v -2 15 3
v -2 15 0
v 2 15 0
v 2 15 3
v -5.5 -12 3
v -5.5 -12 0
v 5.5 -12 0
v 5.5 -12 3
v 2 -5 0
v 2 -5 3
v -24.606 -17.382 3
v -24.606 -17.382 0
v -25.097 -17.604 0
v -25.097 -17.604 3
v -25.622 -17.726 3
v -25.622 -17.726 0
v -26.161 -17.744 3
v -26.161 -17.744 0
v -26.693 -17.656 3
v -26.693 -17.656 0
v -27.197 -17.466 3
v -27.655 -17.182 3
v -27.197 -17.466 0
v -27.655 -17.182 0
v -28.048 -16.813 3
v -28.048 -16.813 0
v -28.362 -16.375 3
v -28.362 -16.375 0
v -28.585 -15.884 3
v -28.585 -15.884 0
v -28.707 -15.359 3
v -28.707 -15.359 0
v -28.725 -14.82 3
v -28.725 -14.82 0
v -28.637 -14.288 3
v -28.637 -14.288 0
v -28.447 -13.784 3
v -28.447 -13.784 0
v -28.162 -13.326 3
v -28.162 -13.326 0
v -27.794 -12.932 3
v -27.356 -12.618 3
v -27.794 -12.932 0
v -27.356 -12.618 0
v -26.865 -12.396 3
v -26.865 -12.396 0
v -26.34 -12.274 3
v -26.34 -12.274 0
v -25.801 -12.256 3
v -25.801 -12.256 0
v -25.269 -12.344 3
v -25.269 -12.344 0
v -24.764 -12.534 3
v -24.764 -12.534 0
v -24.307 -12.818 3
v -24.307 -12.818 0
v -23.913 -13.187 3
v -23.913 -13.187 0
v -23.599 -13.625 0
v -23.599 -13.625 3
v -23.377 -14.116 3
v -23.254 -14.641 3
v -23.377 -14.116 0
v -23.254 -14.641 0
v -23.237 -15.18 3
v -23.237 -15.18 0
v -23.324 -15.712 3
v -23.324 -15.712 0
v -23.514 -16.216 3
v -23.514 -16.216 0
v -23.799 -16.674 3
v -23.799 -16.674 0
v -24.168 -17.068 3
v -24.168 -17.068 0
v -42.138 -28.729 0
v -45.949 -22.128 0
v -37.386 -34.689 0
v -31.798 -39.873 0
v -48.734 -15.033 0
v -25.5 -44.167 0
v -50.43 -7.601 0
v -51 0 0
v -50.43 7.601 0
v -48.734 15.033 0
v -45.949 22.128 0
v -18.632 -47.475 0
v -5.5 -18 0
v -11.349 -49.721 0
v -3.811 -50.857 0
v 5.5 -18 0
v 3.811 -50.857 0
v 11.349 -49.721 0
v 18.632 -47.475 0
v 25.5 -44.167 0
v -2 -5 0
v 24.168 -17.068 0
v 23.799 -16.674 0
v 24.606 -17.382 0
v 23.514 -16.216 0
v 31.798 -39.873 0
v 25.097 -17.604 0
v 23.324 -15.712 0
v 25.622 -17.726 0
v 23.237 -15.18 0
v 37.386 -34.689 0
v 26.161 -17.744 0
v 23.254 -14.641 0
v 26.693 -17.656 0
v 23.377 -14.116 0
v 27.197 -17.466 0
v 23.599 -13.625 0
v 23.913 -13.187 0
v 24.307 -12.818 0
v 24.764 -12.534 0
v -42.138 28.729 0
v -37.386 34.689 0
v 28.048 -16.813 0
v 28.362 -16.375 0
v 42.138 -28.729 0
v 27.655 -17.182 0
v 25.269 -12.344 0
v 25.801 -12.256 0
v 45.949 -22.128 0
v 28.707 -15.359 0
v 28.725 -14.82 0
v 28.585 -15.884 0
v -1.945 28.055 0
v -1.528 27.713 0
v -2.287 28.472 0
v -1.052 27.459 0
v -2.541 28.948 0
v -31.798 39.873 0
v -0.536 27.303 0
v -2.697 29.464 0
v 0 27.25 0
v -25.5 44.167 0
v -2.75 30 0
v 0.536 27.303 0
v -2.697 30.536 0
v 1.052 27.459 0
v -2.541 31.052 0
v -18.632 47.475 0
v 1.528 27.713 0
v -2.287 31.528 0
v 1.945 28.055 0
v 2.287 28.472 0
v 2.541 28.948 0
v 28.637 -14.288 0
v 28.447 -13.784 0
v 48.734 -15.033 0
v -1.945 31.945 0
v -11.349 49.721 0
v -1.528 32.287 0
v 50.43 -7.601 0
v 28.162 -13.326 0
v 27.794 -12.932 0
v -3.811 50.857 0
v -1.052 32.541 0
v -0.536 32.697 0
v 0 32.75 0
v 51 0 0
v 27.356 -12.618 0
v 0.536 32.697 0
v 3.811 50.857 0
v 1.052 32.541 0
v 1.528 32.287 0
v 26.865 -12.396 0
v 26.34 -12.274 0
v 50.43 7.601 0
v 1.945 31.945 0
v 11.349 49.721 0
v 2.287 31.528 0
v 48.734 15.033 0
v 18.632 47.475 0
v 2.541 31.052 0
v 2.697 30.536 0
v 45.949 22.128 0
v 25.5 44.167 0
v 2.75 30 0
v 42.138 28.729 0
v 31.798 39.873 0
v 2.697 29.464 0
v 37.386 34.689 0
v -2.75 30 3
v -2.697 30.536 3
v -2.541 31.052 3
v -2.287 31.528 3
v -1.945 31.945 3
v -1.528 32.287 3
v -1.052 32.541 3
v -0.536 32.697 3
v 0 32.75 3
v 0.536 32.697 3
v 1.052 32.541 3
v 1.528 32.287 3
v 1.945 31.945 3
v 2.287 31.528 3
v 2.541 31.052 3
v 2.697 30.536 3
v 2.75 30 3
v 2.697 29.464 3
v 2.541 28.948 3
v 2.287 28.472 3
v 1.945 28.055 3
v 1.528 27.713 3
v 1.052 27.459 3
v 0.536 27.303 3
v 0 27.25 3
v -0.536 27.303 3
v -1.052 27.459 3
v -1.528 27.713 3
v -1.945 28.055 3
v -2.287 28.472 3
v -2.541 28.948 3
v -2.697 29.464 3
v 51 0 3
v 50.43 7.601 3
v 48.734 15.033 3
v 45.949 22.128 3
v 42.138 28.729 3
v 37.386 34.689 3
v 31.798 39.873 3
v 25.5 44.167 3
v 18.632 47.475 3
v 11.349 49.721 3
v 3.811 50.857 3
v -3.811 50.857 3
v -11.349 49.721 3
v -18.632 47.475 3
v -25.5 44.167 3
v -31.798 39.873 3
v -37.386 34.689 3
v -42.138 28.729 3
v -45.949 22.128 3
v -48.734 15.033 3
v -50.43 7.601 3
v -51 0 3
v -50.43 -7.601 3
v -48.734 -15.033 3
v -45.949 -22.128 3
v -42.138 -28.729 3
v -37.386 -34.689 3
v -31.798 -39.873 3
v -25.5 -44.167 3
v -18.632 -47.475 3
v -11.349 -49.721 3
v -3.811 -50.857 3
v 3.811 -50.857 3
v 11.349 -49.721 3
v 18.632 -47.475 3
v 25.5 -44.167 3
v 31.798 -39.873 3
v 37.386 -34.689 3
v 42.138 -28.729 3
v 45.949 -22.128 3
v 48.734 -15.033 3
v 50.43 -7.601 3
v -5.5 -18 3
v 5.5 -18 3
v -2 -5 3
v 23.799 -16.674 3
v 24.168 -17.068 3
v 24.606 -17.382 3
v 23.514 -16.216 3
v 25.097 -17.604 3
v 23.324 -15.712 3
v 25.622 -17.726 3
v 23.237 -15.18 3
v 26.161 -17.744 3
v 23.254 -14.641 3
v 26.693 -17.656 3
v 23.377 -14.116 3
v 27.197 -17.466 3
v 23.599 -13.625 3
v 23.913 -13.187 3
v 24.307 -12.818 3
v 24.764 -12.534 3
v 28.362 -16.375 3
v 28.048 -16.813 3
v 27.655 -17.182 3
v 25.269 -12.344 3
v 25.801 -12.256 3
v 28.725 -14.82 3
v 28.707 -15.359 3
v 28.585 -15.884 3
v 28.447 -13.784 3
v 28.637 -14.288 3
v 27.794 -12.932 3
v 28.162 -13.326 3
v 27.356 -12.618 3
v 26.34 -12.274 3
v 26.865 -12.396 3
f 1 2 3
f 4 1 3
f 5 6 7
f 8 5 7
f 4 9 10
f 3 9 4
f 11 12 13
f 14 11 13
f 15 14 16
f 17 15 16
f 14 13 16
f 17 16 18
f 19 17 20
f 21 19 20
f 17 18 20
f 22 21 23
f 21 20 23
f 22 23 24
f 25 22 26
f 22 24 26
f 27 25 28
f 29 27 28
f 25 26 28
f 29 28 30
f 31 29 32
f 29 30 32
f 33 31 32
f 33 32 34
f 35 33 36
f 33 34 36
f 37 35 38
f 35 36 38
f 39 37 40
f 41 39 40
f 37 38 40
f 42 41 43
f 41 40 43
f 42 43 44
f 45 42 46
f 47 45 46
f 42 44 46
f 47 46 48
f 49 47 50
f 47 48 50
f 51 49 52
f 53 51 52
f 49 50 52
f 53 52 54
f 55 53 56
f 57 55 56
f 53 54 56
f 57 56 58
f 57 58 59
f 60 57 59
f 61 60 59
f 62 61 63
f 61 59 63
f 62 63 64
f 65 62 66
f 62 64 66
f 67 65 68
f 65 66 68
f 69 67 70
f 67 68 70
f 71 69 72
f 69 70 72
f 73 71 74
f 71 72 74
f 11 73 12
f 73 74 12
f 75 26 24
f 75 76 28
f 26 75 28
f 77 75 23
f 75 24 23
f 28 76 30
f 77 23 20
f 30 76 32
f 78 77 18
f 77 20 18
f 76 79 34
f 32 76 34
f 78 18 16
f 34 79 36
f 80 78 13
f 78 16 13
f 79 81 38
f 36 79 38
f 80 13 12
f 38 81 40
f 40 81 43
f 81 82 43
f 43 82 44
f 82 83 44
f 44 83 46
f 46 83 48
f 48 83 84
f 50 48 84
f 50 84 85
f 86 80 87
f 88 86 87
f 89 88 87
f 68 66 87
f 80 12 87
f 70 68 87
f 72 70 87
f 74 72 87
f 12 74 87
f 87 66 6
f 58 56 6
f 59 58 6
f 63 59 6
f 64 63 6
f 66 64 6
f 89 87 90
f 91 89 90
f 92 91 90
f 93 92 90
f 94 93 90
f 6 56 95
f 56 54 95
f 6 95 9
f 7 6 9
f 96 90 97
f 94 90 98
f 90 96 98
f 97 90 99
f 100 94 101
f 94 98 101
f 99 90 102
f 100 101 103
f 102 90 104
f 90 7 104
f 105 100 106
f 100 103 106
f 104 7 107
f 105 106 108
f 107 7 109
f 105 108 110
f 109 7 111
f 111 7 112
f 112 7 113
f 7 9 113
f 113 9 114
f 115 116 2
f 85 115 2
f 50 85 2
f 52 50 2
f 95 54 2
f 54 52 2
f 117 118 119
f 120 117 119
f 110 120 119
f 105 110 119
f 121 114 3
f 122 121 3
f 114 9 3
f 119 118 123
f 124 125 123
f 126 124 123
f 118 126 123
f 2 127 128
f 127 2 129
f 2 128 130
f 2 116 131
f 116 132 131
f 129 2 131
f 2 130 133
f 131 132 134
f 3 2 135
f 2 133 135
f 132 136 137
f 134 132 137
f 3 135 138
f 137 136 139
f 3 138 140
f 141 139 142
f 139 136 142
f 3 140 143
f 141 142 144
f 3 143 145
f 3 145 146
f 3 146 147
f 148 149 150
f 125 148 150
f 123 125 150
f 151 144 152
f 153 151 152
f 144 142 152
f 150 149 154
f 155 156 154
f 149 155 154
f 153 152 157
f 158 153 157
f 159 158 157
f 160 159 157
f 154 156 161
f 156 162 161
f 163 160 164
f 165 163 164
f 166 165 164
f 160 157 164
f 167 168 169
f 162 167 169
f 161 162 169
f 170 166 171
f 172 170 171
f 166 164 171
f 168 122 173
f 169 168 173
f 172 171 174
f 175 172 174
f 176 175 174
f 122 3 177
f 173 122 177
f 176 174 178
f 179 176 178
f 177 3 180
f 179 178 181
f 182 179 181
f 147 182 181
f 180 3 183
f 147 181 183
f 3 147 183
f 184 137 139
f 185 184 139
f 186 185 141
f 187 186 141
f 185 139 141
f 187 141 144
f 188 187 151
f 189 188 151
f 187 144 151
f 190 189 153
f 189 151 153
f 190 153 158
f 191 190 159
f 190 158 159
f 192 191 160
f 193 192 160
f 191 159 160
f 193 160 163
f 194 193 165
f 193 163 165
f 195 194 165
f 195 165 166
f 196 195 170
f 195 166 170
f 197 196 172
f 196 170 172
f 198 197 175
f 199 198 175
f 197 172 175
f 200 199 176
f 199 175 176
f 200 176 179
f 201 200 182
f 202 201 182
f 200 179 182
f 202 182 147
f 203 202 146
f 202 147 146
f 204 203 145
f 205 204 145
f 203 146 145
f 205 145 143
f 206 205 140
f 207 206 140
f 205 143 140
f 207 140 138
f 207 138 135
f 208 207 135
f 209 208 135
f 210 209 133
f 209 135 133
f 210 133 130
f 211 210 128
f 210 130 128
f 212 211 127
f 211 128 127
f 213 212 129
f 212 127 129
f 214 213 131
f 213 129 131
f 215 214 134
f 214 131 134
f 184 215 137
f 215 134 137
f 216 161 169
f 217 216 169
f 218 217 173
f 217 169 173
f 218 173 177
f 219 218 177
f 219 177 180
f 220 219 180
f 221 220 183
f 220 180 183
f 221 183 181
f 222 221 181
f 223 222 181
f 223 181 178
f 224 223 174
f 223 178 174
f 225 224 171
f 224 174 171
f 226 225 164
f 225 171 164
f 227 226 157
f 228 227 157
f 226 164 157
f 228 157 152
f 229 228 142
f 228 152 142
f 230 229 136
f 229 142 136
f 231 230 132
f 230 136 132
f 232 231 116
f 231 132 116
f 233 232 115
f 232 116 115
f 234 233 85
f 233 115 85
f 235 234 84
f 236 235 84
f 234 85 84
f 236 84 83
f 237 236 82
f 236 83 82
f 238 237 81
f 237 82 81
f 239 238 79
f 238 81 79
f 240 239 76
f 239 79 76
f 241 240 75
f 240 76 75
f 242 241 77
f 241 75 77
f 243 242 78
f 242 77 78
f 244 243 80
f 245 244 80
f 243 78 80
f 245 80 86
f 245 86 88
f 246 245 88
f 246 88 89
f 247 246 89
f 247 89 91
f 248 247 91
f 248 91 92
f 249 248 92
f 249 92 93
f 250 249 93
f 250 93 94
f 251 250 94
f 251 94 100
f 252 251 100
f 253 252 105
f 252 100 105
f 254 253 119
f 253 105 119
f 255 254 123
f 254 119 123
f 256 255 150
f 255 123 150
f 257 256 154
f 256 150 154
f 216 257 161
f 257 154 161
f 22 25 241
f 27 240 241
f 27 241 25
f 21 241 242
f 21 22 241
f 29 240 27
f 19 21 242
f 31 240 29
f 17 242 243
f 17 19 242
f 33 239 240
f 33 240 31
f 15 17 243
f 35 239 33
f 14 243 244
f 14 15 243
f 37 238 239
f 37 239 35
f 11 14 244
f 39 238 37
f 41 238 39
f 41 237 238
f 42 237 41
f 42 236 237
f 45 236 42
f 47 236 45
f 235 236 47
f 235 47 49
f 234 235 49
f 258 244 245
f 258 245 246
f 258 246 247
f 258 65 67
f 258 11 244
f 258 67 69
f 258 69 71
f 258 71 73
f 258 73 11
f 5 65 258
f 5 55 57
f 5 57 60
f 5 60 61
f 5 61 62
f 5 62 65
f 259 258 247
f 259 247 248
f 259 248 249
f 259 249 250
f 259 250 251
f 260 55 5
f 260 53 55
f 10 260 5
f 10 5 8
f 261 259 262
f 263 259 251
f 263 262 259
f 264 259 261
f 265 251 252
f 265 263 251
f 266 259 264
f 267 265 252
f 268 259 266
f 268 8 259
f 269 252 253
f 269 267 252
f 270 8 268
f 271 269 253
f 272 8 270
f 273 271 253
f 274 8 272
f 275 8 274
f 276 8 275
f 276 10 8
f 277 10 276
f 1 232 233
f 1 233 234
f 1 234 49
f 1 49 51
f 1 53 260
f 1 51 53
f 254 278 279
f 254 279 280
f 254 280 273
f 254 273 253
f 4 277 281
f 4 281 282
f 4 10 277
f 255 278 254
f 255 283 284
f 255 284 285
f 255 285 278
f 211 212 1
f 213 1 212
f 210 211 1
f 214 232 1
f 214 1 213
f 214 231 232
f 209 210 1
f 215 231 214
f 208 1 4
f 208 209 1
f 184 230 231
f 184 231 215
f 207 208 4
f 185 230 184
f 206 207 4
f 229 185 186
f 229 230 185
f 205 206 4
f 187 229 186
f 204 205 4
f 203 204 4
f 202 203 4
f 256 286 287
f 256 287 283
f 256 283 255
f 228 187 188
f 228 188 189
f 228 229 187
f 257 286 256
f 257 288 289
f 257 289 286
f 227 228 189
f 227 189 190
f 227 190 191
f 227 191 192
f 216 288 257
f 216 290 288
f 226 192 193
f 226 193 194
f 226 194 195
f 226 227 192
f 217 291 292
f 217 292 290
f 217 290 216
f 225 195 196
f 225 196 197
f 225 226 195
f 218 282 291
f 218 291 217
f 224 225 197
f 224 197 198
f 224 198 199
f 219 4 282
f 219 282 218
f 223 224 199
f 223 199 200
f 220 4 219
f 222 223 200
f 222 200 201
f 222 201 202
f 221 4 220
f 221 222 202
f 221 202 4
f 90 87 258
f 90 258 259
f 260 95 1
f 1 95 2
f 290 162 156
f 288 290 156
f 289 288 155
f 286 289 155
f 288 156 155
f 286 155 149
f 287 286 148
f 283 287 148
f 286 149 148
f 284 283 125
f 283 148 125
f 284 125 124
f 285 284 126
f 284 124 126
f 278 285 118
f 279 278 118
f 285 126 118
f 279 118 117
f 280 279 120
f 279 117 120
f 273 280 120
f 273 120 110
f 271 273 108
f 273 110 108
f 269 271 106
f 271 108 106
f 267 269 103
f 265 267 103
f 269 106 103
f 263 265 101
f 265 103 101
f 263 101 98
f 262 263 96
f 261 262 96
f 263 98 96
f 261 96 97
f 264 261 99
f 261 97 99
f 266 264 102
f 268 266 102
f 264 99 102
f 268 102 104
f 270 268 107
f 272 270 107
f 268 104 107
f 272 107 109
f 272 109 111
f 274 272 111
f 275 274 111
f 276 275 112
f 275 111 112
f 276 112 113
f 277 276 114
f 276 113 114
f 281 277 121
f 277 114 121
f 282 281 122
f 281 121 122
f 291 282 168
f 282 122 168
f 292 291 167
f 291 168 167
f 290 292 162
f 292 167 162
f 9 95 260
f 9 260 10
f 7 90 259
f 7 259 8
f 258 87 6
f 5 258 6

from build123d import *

# Parameters (mm, degrees)
SKETCH_2_R               = 51
EXTRUDE_1_DEPTH          = 3
SKETCH_3_R               = 2.75
CUT_EXTRUDE_1_DEPTH      = 3
PATTERN_CIRCULAR_1_COUNT = 3
CUT_EXTRUDE_START        = -13.3
SKETCH_4_R               = 2.75
SKETCH_4_W               = 4
SKETCH_4_H               = 20
SKETCH_4_W_2             = 11
SKETCH_4_H_2             = 6
CUT_EXTRUDE_2_DEPTH      = 13.3


with BuildPart() as part:
    # Эскиз2 → Бобышка-Вытянуть1 (new body)
    with BuildSketch(Plane.XY):
        Circle(SKETCH_2_R)
    extrude(amount=EXTRUDE_1_DEPTH)

    # Эскиз3 → Вырез-Вытянуть1 (cut)
    with BuildSketch(Plane(origin=(0, 0, 0), x_dir=(-1, 0, 0), z_dir=(0, 0, -1))):
        with Locations((0, 30)):
            Circle(SKETCH_3_R)
    cut_extrude_1 = extrude(amount=-CUT_EXTRUDE_1_DEPTH, mode=Mode.SUBTRACT)

    # Круговой массив1: Вырез-Вытянуть1 ×3 about axis
    pattern_circular_1_axis = Axis((0, 0, 0), (0, 0, 1))
    for i in range(1, PATTERN_CIRCULAR_1_COUNT):
        add(cut_extrude_1.rotate(pattern_circular_1_axis, i * 360 / PATTERN_CIRCULAR_1_COUNT), mode=Mode.SUBTRACT)

    # Эскиз4 → Вырез-Вытянуть2 (cut)
    with BuildSketch(Plane.XY.offset(3).offset(CUT_EXTRUDE_START)):
        with Locations(Location((0, 30, 0), (0, 0, 180))):
            Circle(SKETCH_4_R)
        with Locations((0, 5)):
            Rectangle(SKETCH_4_W, SKETCH_4_H)
        with Locations((0, -15)):
            Rectangle(SKETCH_4_W_2, SKETCH_4_H_2)
    extrude(amount=CUT_EXTRUDE_2_DEPTH, mode=Mode.SUBTRACT)


solid = part.part
